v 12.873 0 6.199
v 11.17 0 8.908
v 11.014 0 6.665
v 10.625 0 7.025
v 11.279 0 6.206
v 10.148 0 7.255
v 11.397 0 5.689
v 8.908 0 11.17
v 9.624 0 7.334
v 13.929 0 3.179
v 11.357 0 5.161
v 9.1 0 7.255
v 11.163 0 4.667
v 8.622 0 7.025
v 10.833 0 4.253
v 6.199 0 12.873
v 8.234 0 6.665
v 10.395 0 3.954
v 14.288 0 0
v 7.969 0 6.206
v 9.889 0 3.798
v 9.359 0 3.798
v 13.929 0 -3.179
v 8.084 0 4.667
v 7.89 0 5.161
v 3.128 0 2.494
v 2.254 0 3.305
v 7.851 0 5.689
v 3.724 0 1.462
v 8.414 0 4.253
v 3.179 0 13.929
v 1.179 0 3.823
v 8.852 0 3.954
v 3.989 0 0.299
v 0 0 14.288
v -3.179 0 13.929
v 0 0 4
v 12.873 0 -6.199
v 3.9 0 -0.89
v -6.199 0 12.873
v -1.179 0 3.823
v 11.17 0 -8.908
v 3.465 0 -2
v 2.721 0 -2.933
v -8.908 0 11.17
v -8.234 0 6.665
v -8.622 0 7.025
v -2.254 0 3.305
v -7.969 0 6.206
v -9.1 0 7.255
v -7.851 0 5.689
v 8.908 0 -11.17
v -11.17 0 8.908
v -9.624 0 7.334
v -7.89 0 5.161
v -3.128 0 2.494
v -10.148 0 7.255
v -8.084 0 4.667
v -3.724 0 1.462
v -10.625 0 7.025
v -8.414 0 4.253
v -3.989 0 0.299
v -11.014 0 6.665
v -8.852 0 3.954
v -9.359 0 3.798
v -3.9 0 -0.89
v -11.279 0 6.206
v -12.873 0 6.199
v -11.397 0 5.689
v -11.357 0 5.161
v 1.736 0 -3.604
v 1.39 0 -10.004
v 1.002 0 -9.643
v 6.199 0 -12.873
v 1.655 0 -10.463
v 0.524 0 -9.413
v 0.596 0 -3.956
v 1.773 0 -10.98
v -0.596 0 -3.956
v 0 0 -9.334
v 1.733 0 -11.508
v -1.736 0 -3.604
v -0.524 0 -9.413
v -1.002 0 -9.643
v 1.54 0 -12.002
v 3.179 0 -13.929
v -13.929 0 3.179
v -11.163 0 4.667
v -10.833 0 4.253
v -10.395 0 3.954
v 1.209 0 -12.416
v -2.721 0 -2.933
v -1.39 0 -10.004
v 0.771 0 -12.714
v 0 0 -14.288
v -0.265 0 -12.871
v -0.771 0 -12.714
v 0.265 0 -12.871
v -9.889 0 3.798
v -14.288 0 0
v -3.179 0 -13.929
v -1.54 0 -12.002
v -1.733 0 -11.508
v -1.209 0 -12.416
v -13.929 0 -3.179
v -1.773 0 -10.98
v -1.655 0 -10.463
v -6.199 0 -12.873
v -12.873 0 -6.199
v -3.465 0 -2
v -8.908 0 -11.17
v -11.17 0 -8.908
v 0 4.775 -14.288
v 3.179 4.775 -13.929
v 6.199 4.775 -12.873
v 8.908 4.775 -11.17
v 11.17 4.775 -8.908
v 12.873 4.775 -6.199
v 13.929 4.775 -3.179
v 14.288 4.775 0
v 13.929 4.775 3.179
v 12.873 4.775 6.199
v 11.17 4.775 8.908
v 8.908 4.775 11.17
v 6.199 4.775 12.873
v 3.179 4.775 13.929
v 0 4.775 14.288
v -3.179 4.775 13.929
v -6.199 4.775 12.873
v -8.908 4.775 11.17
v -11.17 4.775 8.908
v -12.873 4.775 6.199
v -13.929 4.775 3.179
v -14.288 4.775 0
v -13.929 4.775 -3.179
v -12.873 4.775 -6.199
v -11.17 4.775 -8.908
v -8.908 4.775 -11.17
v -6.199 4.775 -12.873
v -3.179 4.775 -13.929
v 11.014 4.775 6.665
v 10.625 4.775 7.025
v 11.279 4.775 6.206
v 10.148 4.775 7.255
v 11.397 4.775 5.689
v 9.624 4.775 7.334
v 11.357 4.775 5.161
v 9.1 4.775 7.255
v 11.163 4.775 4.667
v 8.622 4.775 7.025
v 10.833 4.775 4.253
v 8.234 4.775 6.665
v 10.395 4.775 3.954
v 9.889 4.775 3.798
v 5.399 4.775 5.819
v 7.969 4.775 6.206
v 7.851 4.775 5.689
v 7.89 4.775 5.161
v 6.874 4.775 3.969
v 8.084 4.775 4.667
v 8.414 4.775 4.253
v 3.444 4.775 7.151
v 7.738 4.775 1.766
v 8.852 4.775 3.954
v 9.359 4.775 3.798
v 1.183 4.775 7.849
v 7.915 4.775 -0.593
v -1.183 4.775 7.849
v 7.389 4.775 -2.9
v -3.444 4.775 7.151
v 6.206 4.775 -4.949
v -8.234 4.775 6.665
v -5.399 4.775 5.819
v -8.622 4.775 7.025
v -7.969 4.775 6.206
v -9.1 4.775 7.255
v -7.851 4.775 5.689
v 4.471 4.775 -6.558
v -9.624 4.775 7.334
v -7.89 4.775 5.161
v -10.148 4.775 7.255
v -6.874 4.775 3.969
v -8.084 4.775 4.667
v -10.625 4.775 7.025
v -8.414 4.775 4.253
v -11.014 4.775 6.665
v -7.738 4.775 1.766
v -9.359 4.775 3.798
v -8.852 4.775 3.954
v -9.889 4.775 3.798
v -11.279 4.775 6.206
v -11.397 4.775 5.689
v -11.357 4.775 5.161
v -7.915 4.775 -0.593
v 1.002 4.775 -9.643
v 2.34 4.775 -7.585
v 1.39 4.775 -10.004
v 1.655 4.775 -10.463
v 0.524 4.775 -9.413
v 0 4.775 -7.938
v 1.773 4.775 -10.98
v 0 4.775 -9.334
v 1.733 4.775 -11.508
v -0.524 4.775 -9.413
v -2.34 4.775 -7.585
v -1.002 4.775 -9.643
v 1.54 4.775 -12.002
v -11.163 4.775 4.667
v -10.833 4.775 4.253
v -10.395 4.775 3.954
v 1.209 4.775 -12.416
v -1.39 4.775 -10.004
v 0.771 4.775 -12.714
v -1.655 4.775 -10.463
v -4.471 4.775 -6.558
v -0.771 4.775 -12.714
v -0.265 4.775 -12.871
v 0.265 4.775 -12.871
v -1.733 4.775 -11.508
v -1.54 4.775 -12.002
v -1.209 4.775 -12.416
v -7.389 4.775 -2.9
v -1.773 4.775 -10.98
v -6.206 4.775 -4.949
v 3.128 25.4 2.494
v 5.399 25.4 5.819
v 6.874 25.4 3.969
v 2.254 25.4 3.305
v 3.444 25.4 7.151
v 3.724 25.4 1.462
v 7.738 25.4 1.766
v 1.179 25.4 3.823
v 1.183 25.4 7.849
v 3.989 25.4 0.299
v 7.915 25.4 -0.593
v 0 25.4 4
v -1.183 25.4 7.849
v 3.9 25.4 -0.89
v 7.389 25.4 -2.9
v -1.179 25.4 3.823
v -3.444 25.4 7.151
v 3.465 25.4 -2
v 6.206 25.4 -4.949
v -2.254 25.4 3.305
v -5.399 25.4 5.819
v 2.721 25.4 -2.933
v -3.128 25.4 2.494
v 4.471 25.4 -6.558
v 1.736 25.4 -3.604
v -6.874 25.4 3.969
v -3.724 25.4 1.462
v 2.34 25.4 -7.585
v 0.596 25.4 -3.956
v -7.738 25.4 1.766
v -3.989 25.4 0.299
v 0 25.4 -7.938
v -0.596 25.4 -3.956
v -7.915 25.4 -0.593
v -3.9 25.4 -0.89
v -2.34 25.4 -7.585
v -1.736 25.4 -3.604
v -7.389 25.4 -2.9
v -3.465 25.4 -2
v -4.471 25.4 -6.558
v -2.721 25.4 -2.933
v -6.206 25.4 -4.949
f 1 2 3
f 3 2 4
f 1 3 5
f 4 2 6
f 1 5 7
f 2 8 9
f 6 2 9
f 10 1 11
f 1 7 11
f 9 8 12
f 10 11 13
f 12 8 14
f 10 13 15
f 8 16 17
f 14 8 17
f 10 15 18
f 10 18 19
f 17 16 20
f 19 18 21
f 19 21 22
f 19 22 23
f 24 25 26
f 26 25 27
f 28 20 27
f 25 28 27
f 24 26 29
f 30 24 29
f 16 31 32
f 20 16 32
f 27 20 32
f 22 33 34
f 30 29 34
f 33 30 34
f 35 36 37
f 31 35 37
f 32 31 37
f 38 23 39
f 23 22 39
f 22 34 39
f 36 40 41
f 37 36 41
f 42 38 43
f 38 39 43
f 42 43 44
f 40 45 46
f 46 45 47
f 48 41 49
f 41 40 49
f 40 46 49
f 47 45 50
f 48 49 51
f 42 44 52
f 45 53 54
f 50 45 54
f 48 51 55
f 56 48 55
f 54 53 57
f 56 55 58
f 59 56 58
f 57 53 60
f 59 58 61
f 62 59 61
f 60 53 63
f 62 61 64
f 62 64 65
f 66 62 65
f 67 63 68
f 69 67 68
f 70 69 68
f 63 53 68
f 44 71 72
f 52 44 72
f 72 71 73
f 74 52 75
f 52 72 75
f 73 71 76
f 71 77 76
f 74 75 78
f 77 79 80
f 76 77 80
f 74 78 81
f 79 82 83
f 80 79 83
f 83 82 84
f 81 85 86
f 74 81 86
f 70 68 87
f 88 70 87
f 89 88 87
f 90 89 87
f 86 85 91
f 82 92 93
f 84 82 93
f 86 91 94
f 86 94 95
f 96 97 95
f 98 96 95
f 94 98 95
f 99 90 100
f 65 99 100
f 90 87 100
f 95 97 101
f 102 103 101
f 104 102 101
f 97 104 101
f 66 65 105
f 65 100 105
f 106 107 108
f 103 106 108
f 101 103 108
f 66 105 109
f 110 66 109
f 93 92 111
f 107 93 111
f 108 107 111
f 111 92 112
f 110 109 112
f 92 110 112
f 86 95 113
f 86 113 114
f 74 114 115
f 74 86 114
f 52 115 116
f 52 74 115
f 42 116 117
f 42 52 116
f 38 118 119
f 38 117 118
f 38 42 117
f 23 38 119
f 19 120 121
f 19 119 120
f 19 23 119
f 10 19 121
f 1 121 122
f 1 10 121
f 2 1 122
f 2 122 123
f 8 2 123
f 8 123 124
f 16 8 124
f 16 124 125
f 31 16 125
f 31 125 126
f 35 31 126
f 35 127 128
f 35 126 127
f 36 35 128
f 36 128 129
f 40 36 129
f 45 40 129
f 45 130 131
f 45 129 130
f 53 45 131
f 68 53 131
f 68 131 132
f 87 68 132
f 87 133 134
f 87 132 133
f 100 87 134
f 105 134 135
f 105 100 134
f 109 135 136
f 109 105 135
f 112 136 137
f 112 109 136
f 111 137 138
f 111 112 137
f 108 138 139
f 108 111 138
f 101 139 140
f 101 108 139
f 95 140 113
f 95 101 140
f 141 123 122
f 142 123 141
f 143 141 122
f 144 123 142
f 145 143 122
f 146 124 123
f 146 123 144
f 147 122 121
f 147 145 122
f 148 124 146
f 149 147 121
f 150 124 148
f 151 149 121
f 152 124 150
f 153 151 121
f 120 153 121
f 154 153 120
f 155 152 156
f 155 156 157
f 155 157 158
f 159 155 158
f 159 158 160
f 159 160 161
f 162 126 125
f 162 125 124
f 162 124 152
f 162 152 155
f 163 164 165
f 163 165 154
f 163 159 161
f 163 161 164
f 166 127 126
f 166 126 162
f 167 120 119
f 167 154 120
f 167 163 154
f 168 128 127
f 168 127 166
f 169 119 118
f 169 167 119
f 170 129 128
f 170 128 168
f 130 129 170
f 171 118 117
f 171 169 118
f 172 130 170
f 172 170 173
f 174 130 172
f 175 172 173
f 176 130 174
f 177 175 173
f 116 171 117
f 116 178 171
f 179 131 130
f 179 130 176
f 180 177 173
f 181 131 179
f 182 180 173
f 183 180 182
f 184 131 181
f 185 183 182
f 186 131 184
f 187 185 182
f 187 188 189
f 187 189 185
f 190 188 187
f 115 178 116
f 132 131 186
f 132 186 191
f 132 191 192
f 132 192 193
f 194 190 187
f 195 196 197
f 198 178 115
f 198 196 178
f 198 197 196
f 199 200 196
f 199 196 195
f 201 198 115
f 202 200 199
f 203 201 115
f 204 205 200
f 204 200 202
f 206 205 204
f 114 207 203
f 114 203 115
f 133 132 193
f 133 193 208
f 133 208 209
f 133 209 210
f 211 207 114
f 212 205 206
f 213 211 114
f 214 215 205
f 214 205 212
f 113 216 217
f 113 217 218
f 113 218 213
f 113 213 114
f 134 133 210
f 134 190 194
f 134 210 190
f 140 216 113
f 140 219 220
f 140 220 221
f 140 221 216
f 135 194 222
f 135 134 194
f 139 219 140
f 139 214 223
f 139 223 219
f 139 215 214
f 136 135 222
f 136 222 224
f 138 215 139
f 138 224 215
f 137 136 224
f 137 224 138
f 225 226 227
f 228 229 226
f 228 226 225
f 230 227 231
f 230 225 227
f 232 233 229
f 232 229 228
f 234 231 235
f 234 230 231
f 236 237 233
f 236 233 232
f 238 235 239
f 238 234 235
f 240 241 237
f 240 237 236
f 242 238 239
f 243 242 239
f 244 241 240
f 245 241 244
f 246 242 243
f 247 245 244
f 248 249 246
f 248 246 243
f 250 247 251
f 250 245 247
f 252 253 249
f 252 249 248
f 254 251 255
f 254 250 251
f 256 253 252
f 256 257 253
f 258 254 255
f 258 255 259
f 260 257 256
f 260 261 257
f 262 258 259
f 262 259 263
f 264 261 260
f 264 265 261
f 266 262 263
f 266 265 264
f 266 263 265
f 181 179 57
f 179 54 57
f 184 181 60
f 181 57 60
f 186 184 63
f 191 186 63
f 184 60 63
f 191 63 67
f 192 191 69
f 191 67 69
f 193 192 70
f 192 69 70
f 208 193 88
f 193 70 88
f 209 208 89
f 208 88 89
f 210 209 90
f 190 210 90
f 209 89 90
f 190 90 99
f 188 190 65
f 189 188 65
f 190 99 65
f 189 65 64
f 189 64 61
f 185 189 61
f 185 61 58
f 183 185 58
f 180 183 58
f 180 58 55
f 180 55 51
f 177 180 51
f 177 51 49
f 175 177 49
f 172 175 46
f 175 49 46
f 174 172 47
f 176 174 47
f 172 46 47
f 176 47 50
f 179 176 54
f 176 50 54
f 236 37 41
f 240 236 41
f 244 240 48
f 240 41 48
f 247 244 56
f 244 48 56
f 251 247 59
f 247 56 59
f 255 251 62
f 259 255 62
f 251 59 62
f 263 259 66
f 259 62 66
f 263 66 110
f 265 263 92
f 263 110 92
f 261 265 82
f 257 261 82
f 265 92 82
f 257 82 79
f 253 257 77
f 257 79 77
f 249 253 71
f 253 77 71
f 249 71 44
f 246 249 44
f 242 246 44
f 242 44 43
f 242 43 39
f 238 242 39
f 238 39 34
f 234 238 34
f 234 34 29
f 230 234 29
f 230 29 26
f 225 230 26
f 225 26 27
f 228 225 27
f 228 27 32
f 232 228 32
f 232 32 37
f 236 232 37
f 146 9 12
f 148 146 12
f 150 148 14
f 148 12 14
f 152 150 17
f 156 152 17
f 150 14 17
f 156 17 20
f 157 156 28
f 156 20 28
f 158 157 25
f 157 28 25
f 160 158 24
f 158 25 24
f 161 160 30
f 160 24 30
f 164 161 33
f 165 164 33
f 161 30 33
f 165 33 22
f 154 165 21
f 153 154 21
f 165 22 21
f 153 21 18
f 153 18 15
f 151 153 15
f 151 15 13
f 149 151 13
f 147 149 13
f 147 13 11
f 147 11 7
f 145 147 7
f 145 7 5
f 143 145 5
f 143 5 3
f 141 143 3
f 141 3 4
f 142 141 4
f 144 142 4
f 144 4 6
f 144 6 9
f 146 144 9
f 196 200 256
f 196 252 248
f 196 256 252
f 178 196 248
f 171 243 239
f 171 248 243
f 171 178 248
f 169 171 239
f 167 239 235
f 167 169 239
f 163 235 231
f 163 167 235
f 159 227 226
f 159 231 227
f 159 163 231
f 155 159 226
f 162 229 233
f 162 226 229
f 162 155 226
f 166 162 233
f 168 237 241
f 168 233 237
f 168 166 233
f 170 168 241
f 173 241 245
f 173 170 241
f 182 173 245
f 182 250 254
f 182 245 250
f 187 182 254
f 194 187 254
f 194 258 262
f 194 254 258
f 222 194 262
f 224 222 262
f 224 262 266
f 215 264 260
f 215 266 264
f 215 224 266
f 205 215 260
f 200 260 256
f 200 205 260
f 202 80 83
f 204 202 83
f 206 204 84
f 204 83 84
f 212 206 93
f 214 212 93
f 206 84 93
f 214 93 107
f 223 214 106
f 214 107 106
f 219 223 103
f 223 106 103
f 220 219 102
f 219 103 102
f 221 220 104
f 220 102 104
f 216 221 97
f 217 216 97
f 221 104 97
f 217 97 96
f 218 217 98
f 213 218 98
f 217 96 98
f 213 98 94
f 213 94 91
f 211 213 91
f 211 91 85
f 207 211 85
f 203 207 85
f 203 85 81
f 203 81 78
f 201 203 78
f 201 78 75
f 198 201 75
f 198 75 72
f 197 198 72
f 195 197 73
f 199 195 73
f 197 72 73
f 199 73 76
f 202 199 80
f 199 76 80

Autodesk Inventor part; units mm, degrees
ref_plane "YZ Plane" through (0, 0, 0) normal (1, 0, 0) x (0, 1, 0)
ref_plane "XZ Plane" through (0, 0, 0) normal (0, 1, 0) x (-1, 0, 0)
ref_plane "XY Plane" through (0, 0, 0) normal (0, 0, 1) x (1, 0, 0)
sketch "Sketch1" plane through (0, 0, 0) normal (1, 0, 0) x (0, 1, 0)
  line L0 (0, 0) -> (25.4, 0)
  line L1 (25.4, 0) -> (25.4, -7.9375)
  line L2 (25.4, -7.9375) -> (4.7752, -7.9375)
  line L3 (4.7752, -7.9375) -> (4.7752, -14.2875)
  line L4 (4.7752, -14.2875) -> (0, -14.2875)
  line L5 (0, -14.2875) -> (0, 0)
  dimension "d0" = 25.4
  dimension "d1" = 4.7752
  dimension "d2" = 7.9375
  dimension "d3" = 14.2875
revolve "Revolution1" add sketch "Sketch1" angle 360 about axis through (0, 0, 0) along (0, 1, 0)
hole "Hole1" at (0, 25.4, 0) direction (0, -1, 0) diameter 8.001 end through all thread size "TR10x2" class "7H" standard "ISO Metric Trapezoidal Threads"
sketch "Sketch2" plane through (0, 4.7752, 0) normal (0, 1, 0) x (1, 0, 0)
  circle A0 centre (0, 0) radius 11.1125
  line L0 (-9.6237, -5.5562) -> (0, 0)
  line L1 (0, 0) -> (9.6237, -5.5562)
  line L2 (0, 0) -> (0, 11.1125)
  point P0 (-9.6237, -5.5562)
  dimension "d16" = 120
  dimension "d17" = 120
  dimension "d18" = 22.225
hole "Hole2" at (0, 4.7752, -11.1125) at (-9.6237, 4.7752, 5.5562) at (9.6237, 4.7752, 5.5562) direction (0, -1, 0) diameter 3.556 end through all
properties part number "Lead_Screw_Flange_Nut"
